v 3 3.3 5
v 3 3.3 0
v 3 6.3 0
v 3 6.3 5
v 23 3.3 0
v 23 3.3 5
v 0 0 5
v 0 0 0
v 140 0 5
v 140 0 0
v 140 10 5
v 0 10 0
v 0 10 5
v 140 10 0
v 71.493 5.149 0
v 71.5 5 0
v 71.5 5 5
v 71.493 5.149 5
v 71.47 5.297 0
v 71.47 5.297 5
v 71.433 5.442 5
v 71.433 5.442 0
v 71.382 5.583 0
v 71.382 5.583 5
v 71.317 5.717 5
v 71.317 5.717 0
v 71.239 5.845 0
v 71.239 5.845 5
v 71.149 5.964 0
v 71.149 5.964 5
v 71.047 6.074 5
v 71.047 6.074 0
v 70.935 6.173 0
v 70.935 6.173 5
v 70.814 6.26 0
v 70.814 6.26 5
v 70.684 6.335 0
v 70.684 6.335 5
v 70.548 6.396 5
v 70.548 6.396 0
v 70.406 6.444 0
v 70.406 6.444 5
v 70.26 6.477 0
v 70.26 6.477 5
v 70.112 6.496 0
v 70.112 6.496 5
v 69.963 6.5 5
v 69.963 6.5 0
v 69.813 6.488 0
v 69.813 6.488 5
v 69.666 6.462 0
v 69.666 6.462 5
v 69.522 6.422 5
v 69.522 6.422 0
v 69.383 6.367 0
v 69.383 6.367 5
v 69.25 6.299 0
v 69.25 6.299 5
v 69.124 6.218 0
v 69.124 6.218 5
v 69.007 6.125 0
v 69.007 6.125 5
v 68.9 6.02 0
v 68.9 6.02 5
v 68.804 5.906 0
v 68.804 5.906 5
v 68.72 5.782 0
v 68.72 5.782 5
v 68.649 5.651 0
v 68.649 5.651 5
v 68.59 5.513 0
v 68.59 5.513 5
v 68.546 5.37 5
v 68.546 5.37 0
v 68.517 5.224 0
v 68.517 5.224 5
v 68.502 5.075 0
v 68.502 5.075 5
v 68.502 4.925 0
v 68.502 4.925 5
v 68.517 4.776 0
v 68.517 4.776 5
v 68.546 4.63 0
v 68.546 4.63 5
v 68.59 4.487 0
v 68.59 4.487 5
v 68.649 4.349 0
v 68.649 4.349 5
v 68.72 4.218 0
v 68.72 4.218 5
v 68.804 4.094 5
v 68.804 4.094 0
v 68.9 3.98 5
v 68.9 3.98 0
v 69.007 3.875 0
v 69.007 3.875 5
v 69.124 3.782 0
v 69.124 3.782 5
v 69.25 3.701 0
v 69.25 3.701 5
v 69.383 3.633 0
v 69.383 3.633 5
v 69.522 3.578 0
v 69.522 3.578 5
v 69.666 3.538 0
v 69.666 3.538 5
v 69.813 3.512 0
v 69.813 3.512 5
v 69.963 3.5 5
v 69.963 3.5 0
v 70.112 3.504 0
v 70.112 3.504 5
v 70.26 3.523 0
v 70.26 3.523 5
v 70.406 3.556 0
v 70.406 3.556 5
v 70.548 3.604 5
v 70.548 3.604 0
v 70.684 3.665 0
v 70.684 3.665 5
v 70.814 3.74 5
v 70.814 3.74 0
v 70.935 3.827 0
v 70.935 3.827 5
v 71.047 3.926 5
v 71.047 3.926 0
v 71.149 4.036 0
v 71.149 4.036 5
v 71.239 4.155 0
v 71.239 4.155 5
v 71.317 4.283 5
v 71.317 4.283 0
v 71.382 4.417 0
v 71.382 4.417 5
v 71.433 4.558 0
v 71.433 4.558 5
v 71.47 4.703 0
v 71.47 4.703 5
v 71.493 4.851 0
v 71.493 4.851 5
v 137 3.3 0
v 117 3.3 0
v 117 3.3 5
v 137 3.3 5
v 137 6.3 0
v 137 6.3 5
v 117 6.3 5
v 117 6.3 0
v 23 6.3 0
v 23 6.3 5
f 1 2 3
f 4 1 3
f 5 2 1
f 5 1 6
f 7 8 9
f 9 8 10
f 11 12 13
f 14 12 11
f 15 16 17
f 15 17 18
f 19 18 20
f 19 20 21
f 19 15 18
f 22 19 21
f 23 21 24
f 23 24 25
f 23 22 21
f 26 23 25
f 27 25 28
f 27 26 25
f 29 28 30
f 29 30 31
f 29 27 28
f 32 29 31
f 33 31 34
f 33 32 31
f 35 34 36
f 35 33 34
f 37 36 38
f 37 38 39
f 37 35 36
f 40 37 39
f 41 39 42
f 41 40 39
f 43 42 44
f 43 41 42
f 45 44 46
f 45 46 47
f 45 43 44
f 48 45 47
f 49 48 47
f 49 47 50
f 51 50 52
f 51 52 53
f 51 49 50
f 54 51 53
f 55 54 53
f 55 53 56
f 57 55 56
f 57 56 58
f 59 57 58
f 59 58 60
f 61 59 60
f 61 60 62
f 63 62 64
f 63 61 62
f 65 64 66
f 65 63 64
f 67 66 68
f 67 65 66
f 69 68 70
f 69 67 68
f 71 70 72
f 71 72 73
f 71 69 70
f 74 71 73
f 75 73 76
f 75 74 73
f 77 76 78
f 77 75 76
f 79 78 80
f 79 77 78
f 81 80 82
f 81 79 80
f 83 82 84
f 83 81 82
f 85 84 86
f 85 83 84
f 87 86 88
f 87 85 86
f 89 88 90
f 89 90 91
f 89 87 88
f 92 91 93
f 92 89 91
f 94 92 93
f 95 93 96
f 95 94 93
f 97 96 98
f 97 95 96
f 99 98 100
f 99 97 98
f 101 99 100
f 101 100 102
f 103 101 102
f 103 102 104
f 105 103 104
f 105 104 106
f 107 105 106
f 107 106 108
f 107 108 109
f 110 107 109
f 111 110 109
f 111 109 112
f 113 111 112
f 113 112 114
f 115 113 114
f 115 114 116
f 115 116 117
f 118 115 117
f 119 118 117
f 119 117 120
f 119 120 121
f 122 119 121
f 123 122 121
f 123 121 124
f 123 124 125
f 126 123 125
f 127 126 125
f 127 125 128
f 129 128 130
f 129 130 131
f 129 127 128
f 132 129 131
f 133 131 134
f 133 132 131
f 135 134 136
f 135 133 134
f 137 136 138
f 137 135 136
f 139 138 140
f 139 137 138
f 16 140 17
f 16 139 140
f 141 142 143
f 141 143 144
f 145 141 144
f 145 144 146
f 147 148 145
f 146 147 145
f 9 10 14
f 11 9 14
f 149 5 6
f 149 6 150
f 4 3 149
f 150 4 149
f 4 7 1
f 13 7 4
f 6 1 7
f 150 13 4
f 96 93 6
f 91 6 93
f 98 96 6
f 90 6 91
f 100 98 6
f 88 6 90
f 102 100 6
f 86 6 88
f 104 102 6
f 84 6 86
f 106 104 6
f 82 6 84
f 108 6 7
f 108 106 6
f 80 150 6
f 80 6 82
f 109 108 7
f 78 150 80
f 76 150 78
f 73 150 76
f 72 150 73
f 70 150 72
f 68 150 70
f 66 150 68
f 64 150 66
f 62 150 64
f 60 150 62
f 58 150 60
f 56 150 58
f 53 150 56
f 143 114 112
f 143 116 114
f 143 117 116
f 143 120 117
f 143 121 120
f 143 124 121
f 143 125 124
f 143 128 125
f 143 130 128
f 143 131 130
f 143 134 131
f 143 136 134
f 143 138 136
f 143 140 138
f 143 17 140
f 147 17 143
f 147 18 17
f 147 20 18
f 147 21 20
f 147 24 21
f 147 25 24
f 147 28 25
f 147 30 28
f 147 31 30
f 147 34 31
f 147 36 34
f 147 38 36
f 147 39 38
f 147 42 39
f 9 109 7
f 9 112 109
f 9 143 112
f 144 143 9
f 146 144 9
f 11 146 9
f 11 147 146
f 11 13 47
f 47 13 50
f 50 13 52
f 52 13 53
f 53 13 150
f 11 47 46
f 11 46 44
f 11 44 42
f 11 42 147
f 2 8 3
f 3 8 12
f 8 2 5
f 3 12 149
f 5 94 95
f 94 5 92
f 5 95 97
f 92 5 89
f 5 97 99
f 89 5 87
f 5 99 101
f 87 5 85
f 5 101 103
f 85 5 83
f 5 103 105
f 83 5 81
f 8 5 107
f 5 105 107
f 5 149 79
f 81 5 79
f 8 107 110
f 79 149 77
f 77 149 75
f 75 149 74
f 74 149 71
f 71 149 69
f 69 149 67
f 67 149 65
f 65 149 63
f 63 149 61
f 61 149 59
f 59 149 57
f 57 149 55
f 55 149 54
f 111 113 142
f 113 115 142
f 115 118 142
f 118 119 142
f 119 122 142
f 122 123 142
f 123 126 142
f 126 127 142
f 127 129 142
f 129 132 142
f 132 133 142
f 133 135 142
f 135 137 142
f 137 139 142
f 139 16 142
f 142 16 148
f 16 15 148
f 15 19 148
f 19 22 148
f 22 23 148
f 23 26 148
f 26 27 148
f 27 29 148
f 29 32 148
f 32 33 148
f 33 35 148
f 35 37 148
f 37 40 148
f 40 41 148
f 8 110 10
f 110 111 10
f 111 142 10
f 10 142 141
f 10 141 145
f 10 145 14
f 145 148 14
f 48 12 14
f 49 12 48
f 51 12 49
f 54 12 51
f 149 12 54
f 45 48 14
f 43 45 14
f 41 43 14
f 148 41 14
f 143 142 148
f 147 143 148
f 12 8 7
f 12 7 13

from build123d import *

# Parameters (mm, degrees)
F0_W     = 140
F0_H     = 10
F0_W_2   = 20
F0_H_2   = 3
F0_R     = 1.5
F1_DEPTH = 5


with BuildPart() as f1:
    # F0 (on Top) → F1 (new body)
    with BuildSketch(Plane.XY):
        with Locations((70, 5)):
            Rectangle(F0_W, F0_H)
        with Locations((13, 4.8)):
            Rectangle(F0_W_2, F0_H_2, mode=Mode.SUBTRACT)
        with Locations((127, 4.8)):
            Rectangle(F0_W_2, F0_H_2, mode=Mode.SUBTRACT)
        with Locations((70, 5)):
            Circle(F0_R, mode=Mode.SUBTRACT)
    extrude(amount=F1_DEPTH)


solid = f1.part
